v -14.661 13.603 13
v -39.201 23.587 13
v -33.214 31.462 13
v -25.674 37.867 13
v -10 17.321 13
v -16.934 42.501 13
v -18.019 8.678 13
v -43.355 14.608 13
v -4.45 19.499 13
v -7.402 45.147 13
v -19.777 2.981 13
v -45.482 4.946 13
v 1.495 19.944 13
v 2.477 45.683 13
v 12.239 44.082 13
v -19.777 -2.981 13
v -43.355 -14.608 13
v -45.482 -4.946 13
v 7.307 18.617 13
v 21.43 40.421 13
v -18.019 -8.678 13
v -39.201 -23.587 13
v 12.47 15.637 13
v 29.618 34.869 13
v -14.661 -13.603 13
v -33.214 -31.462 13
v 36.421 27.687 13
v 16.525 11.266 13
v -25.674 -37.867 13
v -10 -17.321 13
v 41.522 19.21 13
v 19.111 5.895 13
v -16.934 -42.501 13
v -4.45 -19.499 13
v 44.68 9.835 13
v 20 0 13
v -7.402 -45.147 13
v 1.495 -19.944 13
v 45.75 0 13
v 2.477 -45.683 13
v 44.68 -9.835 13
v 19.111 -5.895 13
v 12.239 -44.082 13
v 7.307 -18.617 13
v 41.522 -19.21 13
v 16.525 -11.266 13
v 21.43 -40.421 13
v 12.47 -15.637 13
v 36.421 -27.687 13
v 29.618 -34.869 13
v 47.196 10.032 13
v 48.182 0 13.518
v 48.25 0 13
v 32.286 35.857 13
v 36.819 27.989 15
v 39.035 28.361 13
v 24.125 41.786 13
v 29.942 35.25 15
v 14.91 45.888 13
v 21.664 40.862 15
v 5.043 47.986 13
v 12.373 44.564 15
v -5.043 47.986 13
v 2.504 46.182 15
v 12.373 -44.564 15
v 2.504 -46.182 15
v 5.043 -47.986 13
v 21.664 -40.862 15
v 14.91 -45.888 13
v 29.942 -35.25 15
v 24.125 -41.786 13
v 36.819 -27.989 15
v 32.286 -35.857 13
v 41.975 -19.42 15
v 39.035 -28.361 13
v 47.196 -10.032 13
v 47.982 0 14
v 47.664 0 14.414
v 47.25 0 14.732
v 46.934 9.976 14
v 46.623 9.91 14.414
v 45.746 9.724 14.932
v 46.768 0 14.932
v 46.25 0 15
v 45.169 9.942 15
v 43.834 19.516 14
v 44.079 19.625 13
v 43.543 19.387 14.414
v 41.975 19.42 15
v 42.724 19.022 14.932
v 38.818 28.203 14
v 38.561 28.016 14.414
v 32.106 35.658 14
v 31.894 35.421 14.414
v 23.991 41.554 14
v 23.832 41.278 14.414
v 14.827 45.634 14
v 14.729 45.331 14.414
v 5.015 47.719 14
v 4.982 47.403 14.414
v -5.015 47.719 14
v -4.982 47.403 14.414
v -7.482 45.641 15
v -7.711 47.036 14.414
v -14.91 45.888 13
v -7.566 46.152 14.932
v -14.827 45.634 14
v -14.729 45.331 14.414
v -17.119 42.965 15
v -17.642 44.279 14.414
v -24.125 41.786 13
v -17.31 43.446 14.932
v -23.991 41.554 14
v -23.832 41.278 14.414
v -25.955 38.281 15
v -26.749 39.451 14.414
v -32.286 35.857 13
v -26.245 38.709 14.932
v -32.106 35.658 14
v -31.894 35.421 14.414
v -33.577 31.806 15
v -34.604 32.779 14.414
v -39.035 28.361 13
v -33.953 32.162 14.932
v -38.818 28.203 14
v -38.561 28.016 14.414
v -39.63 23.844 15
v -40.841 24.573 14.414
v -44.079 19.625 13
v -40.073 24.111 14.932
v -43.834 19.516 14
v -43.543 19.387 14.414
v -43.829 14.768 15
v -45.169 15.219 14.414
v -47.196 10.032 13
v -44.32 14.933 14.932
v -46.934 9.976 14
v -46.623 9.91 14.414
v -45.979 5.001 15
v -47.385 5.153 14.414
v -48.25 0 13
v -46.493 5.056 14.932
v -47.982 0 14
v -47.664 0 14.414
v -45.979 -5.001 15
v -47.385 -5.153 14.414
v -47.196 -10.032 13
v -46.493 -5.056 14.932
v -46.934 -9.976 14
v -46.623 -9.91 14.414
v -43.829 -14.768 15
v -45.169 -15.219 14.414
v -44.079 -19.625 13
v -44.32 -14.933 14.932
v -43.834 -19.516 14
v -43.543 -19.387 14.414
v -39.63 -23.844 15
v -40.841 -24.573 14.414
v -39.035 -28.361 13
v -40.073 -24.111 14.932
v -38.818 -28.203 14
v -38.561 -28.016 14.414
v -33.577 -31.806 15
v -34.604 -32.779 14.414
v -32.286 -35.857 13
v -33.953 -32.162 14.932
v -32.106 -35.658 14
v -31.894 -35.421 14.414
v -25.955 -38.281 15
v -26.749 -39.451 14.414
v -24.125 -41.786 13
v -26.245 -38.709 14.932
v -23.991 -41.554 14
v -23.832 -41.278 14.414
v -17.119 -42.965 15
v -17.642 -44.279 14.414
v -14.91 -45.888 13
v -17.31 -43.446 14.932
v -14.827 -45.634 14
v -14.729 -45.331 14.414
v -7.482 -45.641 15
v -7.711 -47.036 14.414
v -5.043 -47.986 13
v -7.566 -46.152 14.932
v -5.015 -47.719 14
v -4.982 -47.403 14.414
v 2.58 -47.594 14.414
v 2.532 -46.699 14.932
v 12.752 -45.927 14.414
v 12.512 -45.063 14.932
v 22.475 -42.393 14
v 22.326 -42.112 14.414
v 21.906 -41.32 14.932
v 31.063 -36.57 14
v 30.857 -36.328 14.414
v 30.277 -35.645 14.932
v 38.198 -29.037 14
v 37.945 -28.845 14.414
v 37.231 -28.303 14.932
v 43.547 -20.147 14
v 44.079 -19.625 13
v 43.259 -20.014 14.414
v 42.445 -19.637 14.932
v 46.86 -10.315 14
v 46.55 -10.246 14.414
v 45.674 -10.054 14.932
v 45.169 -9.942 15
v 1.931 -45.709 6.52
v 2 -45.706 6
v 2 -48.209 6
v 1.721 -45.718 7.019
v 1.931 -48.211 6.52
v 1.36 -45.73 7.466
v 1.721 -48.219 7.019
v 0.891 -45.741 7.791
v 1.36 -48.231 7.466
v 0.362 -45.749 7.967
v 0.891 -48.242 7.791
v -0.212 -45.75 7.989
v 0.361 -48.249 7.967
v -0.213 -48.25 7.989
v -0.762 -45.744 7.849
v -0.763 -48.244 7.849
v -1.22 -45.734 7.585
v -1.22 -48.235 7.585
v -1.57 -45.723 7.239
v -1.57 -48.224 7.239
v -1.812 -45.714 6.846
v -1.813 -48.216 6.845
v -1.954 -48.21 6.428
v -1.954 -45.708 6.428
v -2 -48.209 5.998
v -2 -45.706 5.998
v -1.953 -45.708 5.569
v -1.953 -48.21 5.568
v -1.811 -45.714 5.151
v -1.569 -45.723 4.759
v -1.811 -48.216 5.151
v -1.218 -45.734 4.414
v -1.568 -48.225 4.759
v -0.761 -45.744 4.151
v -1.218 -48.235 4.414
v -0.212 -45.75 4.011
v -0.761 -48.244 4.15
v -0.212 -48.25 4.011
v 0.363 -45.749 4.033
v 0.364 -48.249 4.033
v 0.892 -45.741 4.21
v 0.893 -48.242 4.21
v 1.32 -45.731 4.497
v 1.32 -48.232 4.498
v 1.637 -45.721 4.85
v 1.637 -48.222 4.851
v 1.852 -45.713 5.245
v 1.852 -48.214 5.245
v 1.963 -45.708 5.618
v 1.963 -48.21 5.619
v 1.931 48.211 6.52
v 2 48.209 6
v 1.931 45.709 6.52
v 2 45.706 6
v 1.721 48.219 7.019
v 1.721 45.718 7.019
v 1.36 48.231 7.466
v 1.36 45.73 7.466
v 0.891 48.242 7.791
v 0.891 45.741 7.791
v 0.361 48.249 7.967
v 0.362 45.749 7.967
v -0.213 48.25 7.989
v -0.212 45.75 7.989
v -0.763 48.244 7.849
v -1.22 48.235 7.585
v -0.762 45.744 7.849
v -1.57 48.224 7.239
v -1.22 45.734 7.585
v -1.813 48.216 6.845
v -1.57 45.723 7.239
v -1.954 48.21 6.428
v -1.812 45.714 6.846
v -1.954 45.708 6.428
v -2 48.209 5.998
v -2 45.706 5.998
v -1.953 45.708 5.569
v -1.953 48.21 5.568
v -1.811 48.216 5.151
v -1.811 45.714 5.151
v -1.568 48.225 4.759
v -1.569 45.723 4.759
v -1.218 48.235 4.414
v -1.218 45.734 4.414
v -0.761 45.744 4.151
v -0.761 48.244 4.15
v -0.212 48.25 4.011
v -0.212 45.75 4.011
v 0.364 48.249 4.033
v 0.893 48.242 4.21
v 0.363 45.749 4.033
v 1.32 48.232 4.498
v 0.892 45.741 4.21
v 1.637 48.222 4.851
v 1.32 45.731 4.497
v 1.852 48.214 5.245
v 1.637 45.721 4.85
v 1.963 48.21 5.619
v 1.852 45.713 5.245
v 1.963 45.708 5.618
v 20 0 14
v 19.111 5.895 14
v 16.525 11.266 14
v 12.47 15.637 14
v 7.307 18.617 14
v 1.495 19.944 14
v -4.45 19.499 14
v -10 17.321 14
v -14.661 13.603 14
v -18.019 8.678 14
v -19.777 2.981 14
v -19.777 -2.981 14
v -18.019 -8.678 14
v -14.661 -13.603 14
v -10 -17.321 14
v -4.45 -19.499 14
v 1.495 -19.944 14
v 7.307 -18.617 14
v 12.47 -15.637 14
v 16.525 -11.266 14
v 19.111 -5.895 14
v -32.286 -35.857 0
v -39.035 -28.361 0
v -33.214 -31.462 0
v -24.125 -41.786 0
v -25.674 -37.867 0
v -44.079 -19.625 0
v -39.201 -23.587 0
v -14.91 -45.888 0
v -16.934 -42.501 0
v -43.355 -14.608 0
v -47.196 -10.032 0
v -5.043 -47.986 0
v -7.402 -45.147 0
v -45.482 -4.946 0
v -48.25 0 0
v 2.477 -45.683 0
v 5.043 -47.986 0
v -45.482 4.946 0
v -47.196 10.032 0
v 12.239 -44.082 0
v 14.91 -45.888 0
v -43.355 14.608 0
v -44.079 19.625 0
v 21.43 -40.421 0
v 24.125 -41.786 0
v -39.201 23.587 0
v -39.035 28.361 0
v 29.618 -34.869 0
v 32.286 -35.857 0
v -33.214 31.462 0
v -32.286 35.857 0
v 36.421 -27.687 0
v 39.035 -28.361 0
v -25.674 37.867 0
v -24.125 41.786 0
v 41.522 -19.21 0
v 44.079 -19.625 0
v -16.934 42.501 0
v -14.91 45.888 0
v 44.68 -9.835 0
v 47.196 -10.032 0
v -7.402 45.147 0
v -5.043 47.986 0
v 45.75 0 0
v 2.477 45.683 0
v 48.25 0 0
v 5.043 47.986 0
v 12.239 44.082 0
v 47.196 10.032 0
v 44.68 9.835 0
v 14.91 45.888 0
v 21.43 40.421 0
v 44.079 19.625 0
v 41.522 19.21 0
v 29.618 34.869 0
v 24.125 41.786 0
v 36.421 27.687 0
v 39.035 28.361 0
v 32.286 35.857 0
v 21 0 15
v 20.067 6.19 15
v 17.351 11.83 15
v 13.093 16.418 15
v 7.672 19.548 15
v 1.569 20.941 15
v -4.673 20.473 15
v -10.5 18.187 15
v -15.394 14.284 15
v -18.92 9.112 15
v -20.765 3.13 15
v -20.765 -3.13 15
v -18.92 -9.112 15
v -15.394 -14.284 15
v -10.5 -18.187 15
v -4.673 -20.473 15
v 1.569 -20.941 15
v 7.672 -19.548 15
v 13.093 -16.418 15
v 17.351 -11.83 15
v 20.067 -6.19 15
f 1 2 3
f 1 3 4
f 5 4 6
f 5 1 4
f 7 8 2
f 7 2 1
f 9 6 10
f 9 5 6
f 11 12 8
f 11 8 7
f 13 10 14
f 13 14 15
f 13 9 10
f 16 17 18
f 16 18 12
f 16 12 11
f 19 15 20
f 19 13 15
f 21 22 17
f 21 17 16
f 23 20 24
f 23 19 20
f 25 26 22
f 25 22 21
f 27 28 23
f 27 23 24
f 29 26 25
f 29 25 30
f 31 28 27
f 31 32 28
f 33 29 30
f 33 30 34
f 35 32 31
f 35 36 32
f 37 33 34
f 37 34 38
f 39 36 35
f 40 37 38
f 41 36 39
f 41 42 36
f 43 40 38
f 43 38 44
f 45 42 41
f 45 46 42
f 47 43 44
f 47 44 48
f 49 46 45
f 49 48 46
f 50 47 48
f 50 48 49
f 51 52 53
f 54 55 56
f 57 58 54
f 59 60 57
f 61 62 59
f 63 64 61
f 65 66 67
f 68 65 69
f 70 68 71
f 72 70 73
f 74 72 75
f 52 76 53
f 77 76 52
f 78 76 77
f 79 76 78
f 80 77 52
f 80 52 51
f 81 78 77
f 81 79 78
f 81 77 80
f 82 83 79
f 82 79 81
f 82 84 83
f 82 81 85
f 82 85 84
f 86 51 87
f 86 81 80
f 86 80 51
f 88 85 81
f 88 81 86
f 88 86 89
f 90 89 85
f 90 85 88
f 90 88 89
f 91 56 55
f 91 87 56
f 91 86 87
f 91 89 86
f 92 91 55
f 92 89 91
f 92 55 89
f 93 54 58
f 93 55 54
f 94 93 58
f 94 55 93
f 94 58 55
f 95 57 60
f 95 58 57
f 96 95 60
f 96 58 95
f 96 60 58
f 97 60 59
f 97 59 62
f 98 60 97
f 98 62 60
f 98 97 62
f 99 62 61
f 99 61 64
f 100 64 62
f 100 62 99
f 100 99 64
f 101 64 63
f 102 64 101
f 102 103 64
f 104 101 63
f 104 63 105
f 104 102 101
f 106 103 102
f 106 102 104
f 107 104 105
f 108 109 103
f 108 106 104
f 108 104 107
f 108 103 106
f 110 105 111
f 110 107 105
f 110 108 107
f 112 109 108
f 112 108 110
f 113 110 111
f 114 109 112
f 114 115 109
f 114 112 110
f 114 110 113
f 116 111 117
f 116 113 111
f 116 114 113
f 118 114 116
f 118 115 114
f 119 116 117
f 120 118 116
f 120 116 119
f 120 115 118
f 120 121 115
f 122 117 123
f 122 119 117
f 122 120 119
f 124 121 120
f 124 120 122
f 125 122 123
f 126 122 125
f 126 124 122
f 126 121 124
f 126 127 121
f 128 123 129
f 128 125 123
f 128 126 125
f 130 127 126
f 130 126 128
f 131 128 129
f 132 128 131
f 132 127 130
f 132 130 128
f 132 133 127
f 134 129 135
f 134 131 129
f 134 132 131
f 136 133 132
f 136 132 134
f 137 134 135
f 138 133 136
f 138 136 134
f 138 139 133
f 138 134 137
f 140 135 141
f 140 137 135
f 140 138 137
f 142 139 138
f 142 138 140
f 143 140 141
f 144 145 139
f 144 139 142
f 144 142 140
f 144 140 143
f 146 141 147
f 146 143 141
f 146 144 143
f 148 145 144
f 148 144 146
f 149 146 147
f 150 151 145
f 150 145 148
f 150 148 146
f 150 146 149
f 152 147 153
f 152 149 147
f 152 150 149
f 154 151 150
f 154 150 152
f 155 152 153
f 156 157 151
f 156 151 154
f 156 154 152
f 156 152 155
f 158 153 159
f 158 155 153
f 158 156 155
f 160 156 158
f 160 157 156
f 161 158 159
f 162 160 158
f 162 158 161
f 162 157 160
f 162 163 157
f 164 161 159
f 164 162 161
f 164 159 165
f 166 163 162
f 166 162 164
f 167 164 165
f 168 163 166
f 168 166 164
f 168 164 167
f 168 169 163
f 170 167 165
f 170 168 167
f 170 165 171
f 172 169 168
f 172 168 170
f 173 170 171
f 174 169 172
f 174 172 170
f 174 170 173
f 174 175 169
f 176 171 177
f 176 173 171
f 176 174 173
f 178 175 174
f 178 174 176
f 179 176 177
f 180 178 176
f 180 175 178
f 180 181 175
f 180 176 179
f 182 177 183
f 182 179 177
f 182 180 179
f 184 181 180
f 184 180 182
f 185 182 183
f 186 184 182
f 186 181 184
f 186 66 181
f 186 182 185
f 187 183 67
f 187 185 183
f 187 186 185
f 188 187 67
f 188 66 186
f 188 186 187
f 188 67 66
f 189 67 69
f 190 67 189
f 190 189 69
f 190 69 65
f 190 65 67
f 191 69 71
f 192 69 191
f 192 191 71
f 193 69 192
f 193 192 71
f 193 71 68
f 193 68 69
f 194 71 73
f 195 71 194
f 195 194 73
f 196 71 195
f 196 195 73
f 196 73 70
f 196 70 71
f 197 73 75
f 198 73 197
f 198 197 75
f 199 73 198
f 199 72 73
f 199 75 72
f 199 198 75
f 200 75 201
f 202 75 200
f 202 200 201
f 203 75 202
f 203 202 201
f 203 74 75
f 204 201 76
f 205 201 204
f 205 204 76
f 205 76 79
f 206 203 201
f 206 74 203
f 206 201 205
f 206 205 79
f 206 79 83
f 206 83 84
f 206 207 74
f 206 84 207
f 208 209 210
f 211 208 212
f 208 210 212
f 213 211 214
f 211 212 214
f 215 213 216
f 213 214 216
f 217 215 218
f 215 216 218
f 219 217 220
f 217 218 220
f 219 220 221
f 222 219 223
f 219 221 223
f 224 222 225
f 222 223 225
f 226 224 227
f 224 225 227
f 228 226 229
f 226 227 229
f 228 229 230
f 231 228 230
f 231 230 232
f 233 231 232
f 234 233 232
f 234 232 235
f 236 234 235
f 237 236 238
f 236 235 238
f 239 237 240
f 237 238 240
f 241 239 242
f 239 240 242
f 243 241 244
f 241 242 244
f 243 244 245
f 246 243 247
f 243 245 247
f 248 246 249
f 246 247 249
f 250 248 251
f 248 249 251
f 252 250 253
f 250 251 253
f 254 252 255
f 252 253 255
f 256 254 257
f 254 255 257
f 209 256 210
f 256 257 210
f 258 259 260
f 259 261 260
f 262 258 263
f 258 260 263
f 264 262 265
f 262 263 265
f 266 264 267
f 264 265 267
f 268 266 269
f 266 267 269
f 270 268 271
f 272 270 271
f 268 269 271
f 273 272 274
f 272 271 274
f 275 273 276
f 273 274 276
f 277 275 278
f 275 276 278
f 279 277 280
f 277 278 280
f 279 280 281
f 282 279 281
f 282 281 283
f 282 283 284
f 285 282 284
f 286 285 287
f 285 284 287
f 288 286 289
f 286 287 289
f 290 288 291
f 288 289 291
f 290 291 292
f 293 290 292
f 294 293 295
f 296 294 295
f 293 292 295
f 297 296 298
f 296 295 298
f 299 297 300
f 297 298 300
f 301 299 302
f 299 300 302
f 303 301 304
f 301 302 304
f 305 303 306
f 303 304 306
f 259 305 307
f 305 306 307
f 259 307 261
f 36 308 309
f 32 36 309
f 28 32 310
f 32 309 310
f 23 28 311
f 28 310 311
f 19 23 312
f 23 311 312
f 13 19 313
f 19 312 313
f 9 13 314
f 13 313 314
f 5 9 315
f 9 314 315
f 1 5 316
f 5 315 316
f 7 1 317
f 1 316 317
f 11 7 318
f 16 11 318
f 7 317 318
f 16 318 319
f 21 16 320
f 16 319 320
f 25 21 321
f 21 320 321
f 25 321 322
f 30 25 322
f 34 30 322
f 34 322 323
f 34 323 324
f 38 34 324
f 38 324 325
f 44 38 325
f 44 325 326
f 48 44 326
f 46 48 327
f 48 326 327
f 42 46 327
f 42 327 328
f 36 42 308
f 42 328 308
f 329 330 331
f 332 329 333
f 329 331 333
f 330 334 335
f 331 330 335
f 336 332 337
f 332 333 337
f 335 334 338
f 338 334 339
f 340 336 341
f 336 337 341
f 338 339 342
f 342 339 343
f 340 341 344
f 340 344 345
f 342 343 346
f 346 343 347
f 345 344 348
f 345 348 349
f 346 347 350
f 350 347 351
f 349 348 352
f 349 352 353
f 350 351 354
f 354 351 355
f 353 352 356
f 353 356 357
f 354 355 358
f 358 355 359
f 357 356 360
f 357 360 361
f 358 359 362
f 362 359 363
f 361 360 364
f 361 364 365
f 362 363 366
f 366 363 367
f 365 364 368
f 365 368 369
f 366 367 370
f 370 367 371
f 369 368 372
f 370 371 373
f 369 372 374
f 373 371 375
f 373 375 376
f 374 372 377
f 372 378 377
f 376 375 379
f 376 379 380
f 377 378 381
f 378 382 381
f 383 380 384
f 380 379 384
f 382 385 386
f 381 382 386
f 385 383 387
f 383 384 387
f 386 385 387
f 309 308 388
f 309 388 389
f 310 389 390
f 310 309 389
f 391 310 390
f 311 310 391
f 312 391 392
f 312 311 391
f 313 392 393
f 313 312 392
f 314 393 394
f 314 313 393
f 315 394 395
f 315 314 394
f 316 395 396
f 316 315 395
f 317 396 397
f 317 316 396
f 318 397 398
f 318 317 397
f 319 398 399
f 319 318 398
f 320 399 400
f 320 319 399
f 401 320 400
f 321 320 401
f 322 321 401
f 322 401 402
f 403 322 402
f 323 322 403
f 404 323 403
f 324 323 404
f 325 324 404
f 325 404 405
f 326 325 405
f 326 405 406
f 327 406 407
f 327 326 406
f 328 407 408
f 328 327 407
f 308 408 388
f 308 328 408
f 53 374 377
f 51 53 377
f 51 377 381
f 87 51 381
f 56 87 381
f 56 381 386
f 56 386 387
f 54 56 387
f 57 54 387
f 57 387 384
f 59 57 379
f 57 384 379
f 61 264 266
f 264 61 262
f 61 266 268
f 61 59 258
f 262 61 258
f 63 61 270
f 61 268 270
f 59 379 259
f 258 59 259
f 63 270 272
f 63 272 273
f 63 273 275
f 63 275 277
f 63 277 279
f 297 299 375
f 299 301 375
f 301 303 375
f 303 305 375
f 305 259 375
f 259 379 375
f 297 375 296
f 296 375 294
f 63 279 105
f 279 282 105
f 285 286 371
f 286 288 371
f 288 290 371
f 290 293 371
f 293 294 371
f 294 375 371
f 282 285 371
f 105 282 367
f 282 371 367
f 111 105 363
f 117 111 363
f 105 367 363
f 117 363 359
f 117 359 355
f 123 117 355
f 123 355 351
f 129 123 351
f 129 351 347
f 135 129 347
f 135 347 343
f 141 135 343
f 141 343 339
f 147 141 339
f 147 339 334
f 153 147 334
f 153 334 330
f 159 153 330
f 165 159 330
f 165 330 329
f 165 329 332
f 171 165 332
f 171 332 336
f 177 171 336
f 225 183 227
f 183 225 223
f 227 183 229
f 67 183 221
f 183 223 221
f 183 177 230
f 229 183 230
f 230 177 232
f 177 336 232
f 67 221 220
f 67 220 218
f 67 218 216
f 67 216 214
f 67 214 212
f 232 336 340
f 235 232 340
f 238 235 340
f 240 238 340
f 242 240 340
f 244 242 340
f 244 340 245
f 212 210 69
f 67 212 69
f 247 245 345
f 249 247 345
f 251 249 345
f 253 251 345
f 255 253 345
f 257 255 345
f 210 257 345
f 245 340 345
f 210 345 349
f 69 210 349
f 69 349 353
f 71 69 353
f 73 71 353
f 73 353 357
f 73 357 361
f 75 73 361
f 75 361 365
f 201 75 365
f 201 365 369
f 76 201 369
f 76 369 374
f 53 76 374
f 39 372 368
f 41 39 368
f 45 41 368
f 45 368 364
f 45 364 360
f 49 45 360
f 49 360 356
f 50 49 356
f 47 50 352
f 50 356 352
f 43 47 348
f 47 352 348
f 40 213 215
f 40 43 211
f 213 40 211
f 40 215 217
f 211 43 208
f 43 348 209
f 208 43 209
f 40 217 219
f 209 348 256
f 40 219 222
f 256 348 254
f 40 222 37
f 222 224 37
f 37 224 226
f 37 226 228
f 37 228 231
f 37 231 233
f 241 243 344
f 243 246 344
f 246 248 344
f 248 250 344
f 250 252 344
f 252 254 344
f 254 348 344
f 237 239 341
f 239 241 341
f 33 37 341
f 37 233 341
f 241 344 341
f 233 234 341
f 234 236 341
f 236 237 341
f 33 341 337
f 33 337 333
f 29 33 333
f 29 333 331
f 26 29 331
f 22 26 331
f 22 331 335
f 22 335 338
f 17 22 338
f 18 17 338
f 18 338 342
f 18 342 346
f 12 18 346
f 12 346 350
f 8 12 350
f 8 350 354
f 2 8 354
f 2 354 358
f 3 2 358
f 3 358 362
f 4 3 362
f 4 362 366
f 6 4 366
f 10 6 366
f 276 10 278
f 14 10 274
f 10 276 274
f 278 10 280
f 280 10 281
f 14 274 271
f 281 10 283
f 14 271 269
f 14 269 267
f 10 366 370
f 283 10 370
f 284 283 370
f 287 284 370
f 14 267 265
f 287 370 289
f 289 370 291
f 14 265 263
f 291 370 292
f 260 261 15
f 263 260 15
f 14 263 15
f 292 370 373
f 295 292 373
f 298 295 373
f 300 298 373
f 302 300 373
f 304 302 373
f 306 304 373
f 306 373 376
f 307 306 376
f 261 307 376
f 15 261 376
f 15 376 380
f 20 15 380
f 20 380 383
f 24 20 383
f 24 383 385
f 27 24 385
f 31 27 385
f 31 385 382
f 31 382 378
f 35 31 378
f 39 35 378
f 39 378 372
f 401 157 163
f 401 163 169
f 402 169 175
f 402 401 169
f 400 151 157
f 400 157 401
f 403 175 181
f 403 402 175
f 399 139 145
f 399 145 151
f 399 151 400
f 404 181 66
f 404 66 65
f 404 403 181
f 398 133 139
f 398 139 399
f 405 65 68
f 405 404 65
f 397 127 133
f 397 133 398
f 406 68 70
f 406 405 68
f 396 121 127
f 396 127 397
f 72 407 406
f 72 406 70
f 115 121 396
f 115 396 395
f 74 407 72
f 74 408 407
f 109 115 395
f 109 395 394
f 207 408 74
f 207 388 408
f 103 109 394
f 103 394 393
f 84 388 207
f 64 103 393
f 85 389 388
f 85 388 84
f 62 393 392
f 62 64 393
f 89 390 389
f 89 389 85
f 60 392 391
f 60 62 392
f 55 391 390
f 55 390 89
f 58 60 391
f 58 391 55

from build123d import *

# Parameters (mm, degrees)
SKETCH_R        = 48.25
PAD_DEPTH       = 15
SKETCH001_R     = 45.75
POCKET_DEPTH    = 13
SKETCH002_R     = 2
POCKET001_DEPTH = 50
SKETCH003_R     = 20
POCKET002_DEPTH = 2
FILLET_R        = 2
CHAMFER_SIZE    = 1


with BuildPart() as part:
    # Sketch → Pad (new body)
    with BuildSketch(Plane.XY):
        Circle(SKETCH_R)
    extrude(amount=PAD_DEPTH)

    # Sketch001 (on Face2 of Pad) → Pocket (cut)
    with BuildSketch(Plane(origin=(0, 0, 0), x_dir=(1, 0, 0), z_dir=(0, 0, -1))):
        Circle(SKETCH001_R)
    extrude(amount=-POCKET_DEPTH, mode=Mode.SUBTRACT)

    # Sketch002 → Pocket001 (cut, symmetric)
    with BuildSketch(Plane.XZ):
        with Locations((0, 6)):
            Circle(SKETCH002_R)
    extrude(amount=POCKET001_DEPTH, both=True, mode=Mode.SUBTRACT)

    # Sketch003 (on Face3 of Pocket001) → Pocket002 (cut)
    with BuildSketch(Plane.XY.offset(15)):
        Circle(SKETCH003_R)
    extrude(amount=-POCKET002_DEPTH, mode=Mode.SUBTRACT)

    # Fillet
    fillet_edges = [part.edges().sort_by_distance(p)[0] for p in [
        (-48.25, 0, 15),
    ]]
    fillet(fillet_edges, radius=FILLET_R)

    # Chamfer
    chamfer_edges = [part.edges().sort_by_distance(p)[0] for p in [
        (-20, 0, 15),
    ]]
    chamfer(chamfer_edges, length=CHAMFER_SIZE)


solid = part.part
